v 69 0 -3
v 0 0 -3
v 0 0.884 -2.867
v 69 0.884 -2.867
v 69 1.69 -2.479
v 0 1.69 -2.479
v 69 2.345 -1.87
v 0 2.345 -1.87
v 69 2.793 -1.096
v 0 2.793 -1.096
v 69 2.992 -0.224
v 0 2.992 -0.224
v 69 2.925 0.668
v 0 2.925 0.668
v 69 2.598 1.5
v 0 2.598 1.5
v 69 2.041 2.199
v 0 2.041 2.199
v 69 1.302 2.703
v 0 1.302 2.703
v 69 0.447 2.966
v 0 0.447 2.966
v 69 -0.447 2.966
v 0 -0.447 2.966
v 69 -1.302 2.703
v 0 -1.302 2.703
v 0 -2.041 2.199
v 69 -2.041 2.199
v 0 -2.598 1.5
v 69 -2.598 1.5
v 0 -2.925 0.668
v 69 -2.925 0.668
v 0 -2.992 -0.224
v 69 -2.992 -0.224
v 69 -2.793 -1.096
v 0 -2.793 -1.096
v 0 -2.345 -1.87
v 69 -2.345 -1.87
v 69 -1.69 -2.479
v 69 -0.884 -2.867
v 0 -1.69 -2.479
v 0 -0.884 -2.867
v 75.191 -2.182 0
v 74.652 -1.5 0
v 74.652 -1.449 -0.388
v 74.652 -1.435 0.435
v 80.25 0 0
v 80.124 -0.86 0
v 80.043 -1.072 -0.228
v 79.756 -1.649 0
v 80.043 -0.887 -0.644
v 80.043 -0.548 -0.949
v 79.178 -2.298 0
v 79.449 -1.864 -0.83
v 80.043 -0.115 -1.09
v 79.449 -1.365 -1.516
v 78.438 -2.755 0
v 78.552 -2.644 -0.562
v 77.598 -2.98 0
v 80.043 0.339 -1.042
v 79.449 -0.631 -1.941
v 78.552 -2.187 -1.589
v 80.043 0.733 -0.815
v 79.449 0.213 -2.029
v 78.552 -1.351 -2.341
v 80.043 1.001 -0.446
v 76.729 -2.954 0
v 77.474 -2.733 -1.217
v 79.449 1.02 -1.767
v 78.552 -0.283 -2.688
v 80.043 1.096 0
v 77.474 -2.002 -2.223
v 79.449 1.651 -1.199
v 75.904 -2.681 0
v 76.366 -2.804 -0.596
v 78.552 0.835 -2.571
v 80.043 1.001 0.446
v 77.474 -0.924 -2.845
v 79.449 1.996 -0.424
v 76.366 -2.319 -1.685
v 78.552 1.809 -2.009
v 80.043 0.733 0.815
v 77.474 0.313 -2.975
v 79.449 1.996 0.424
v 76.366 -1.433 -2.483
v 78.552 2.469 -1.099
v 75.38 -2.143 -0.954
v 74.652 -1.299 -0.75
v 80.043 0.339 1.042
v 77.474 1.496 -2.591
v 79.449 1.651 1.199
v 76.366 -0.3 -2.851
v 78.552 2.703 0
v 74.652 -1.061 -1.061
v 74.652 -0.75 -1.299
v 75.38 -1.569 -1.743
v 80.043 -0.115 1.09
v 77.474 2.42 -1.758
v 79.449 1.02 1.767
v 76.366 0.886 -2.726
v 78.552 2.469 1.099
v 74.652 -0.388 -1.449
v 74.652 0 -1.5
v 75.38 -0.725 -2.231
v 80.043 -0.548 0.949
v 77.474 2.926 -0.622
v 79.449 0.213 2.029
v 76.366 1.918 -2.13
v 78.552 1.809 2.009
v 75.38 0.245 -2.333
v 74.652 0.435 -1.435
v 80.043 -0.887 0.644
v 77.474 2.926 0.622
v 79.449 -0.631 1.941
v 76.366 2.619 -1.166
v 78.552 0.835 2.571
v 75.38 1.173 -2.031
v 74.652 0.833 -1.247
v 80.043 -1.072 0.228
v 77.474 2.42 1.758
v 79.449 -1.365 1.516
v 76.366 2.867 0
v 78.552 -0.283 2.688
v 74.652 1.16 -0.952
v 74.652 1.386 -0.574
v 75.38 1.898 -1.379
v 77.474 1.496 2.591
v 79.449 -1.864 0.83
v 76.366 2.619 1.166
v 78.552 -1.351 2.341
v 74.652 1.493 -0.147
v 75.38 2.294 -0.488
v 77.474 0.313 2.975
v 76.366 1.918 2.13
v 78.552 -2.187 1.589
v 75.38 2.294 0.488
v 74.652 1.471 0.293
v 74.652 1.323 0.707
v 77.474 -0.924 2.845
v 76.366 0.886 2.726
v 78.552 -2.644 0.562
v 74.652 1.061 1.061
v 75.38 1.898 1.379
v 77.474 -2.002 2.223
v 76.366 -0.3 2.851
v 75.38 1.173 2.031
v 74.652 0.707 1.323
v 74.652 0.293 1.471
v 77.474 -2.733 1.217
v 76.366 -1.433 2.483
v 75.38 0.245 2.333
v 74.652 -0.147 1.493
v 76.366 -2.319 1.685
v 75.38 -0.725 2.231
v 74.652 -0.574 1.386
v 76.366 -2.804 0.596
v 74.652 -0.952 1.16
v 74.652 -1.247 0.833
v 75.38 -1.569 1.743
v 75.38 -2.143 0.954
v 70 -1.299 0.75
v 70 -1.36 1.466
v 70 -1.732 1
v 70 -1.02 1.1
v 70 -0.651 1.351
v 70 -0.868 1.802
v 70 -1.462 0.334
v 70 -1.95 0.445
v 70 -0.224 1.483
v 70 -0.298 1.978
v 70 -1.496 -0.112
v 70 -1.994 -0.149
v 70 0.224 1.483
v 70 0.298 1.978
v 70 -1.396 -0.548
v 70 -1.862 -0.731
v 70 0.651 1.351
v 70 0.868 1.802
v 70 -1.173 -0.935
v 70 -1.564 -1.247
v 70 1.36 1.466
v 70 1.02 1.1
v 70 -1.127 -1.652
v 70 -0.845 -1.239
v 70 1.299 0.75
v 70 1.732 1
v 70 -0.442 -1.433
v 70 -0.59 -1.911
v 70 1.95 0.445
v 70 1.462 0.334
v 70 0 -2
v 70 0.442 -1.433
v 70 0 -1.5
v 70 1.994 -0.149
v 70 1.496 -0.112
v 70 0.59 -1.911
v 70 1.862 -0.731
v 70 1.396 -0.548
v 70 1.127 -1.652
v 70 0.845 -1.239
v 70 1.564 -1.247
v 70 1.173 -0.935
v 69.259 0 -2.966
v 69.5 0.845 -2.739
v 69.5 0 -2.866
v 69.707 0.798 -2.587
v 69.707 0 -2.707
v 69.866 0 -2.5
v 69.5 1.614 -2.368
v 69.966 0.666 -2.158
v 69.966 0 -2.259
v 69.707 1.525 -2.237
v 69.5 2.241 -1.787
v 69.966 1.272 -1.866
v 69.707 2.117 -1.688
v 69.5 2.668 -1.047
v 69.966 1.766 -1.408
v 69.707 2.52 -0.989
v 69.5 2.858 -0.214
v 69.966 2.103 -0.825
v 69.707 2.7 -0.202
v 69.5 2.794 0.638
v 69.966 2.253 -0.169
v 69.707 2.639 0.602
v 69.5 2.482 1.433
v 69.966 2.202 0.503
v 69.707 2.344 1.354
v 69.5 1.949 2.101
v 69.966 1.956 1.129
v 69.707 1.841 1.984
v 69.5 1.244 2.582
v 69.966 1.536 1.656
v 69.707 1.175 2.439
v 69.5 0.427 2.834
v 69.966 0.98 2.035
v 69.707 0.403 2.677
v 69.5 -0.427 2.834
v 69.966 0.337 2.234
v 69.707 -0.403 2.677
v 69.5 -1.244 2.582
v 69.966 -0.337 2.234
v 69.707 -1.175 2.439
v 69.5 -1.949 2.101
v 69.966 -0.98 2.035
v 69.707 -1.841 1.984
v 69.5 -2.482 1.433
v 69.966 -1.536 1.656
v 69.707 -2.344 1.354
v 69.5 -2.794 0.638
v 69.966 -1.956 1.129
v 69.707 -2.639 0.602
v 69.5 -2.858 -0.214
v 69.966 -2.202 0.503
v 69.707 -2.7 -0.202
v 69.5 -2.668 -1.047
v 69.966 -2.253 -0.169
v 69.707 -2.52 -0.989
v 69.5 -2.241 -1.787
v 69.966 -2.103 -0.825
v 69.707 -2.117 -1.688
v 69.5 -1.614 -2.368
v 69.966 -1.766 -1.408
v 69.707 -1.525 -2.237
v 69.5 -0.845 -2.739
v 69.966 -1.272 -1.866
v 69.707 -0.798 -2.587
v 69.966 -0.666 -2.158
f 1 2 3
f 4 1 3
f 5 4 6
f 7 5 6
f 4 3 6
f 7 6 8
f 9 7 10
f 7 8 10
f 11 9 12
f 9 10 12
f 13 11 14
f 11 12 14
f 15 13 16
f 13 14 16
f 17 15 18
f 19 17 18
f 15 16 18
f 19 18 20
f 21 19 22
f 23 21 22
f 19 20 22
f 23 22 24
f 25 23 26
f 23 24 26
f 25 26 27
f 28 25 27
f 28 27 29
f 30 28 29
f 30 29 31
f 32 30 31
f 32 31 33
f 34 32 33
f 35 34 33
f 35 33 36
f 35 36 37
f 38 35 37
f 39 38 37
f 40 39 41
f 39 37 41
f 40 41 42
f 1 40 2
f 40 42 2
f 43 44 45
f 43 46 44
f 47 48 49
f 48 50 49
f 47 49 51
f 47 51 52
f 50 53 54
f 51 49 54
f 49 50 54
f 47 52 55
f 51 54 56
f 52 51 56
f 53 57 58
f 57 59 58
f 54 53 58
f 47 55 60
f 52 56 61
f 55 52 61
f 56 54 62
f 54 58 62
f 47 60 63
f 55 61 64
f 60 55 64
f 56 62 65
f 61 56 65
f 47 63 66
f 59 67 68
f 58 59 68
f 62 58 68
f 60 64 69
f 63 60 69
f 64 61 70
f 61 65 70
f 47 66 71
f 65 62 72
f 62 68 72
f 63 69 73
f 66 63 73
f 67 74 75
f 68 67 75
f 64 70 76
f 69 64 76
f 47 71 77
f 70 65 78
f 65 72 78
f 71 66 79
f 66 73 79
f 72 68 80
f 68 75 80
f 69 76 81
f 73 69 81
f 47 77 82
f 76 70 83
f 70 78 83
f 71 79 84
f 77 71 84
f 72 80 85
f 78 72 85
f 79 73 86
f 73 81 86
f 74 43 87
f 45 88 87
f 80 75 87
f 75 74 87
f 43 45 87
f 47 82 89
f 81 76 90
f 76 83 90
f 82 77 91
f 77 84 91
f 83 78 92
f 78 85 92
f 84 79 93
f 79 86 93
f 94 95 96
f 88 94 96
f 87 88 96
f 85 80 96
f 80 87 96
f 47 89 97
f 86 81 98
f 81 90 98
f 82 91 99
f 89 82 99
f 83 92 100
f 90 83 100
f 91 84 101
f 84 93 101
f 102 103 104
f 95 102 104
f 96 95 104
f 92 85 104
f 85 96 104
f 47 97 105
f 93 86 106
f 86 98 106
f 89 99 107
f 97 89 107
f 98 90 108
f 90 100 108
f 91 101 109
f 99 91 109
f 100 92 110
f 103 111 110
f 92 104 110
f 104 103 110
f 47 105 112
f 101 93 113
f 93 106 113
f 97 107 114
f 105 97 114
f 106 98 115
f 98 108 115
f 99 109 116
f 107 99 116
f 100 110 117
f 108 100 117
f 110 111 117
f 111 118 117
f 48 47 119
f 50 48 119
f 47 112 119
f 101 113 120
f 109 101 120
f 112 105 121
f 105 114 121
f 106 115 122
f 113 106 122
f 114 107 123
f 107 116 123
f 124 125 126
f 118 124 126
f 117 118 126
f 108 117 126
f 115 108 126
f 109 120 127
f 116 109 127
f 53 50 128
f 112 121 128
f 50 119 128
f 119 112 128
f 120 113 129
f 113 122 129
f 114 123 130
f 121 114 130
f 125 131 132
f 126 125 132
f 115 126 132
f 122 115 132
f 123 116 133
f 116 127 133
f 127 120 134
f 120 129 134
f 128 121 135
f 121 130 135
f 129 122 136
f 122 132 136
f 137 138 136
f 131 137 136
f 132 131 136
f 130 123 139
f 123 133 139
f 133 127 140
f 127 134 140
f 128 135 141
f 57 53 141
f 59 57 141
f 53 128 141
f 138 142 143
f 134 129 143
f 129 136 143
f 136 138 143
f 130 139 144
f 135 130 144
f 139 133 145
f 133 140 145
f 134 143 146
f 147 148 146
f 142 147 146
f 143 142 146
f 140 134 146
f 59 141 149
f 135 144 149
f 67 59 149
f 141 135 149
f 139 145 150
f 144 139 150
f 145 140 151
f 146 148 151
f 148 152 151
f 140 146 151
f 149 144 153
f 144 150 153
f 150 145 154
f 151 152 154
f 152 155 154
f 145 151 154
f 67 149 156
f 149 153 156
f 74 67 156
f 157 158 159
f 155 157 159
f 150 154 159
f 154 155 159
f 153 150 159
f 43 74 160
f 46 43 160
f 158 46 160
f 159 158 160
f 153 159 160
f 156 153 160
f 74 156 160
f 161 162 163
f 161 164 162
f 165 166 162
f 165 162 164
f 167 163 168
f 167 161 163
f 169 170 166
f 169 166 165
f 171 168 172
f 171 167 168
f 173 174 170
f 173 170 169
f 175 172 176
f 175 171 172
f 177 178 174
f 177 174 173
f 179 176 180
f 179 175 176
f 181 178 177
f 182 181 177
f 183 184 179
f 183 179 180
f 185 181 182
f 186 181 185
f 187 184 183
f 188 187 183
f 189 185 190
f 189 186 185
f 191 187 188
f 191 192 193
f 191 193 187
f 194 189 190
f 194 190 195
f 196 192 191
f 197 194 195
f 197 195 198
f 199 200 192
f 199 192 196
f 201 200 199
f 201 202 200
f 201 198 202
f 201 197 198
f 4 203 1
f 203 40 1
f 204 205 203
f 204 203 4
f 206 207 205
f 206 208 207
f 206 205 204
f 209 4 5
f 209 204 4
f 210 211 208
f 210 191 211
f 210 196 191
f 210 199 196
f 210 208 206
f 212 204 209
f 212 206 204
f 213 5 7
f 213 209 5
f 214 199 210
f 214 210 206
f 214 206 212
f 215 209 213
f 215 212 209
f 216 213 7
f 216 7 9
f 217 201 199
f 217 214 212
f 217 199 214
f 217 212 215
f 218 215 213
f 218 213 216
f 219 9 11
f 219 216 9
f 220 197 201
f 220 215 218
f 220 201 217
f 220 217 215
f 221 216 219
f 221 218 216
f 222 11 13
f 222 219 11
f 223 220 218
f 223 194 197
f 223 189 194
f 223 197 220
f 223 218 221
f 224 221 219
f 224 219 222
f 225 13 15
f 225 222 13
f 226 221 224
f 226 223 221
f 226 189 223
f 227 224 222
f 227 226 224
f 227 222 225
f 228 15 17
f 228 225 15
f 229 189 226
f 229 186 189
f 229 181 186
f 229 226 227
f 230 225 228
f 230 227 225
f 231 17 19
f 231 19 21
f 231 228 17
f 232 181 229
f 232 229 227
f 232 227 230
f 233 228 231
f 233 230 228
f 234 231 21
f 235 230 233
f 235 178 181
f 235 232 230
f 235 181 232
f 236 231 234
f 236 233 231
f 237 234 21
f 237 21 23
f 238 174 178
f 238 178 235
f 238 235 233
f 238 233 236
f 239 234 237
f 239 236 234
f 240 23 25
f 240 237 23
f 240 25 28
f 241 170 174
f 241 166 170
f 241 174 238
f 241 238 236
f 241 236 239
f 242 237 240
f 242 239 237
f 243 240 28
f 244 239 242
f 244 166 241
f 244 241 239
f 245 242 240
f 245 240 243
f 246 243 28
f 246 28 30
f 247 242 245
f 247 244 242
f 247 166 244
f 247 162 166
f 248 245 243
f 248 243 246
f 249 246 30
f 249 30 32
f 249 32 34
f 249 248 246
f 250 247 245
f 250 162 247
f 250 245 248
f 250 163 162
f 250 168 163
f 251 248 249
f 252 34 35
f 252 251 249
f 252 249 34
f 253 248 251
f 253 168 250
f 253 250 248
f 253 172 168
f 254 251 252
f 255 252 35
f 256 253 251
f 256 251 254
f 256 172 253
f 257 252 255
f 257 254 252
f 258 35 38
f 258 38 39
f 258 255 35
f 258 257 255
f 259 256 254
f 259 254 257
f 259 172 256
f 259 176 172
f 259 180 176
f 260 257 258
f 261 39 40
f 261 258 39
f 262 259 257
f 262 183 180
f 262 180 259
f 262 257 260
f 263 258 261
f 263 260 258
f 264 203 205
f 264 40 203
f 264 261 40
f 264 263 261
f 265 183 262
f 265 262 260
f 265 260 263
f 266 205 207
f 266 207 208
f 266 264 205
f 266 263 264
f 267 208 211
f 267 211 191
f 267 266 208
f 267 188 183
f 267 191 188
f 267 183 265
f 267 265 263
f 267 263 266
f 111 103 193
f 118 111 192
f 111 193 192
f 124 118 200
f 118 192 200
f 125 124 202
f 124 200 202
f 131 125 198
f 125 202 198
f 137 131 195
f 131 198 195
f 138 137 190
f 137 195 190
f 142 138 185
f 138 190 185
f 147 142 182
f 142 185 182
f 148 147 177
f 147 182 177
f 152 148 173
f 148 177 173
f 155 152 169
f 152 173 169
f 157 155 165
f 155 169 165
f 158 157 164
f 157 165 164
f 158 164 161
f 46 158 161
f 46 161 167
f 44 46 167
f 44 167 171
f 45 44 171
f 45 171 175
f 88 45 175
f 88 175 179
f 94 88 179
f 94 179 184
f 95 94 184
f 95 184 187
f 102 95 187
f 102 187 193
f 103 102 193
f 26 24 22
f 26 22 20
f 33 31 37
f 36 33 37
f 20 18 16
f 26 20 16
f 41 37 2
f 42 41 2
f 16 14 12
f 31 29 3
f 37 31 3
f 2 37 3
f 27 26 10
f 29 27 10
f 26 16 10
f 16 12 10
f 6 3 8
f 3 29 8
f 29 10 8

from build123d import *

# Parameters (mm, degrees)
SKETCH2_R           = 3
BOSS_EXTRUDE1_DEPTH = 70
SKETCH3_R           = 1.5
BOSS_EXTRUDE2_DEPTH = 5
FILLET1_R           = 1


with BuildPart() as part:
    # Sketch2 → Boss-Extrude1 (new body)
    with BuildSketch(Plane(origin=(0, 0, 0), x_dir=(0, 0, -1), z_dir=(1, 0, 0))):
        Circle(SKETCH2_R)
    extrude(amount=BOSS_EXTRUDE1_DEPTH)

    # Sketch3 → Boss-Extrude2 (add)
    with BuildSketch(Plane(origin=(70, 0, 0), x_dir=(0, 0, -1), z_dir=(1, 0, 0))):
        Circle(SKETCH3_R)
    extrude(amount=BOSS_EXTRUDE2_DEPTH)

    # Fillet1
    fillet1_edges = [part.edges().sort_by_distance(p)[0] for p in [
        (70, 0, 3),
    ]]
    fillet(fillet1_edges, radius=FILLET1_R)

    # Sketch4 → Revolve1 (revolve)
    with BuildSketch(Plane.XY):
        with BuildLine():
            Line((75, 0), (77.25, 0))
            Line((77.25, 0), (80.25, 0))
            ThreePointArc((80.25, 0), (77.25, -3), (74.25, 0))
            Line((74.25, 0), (75, 0))
        make_face()
    revolve(axis=Axis((75, 0, 0), (1, 0, 0)))


solid = part.part
